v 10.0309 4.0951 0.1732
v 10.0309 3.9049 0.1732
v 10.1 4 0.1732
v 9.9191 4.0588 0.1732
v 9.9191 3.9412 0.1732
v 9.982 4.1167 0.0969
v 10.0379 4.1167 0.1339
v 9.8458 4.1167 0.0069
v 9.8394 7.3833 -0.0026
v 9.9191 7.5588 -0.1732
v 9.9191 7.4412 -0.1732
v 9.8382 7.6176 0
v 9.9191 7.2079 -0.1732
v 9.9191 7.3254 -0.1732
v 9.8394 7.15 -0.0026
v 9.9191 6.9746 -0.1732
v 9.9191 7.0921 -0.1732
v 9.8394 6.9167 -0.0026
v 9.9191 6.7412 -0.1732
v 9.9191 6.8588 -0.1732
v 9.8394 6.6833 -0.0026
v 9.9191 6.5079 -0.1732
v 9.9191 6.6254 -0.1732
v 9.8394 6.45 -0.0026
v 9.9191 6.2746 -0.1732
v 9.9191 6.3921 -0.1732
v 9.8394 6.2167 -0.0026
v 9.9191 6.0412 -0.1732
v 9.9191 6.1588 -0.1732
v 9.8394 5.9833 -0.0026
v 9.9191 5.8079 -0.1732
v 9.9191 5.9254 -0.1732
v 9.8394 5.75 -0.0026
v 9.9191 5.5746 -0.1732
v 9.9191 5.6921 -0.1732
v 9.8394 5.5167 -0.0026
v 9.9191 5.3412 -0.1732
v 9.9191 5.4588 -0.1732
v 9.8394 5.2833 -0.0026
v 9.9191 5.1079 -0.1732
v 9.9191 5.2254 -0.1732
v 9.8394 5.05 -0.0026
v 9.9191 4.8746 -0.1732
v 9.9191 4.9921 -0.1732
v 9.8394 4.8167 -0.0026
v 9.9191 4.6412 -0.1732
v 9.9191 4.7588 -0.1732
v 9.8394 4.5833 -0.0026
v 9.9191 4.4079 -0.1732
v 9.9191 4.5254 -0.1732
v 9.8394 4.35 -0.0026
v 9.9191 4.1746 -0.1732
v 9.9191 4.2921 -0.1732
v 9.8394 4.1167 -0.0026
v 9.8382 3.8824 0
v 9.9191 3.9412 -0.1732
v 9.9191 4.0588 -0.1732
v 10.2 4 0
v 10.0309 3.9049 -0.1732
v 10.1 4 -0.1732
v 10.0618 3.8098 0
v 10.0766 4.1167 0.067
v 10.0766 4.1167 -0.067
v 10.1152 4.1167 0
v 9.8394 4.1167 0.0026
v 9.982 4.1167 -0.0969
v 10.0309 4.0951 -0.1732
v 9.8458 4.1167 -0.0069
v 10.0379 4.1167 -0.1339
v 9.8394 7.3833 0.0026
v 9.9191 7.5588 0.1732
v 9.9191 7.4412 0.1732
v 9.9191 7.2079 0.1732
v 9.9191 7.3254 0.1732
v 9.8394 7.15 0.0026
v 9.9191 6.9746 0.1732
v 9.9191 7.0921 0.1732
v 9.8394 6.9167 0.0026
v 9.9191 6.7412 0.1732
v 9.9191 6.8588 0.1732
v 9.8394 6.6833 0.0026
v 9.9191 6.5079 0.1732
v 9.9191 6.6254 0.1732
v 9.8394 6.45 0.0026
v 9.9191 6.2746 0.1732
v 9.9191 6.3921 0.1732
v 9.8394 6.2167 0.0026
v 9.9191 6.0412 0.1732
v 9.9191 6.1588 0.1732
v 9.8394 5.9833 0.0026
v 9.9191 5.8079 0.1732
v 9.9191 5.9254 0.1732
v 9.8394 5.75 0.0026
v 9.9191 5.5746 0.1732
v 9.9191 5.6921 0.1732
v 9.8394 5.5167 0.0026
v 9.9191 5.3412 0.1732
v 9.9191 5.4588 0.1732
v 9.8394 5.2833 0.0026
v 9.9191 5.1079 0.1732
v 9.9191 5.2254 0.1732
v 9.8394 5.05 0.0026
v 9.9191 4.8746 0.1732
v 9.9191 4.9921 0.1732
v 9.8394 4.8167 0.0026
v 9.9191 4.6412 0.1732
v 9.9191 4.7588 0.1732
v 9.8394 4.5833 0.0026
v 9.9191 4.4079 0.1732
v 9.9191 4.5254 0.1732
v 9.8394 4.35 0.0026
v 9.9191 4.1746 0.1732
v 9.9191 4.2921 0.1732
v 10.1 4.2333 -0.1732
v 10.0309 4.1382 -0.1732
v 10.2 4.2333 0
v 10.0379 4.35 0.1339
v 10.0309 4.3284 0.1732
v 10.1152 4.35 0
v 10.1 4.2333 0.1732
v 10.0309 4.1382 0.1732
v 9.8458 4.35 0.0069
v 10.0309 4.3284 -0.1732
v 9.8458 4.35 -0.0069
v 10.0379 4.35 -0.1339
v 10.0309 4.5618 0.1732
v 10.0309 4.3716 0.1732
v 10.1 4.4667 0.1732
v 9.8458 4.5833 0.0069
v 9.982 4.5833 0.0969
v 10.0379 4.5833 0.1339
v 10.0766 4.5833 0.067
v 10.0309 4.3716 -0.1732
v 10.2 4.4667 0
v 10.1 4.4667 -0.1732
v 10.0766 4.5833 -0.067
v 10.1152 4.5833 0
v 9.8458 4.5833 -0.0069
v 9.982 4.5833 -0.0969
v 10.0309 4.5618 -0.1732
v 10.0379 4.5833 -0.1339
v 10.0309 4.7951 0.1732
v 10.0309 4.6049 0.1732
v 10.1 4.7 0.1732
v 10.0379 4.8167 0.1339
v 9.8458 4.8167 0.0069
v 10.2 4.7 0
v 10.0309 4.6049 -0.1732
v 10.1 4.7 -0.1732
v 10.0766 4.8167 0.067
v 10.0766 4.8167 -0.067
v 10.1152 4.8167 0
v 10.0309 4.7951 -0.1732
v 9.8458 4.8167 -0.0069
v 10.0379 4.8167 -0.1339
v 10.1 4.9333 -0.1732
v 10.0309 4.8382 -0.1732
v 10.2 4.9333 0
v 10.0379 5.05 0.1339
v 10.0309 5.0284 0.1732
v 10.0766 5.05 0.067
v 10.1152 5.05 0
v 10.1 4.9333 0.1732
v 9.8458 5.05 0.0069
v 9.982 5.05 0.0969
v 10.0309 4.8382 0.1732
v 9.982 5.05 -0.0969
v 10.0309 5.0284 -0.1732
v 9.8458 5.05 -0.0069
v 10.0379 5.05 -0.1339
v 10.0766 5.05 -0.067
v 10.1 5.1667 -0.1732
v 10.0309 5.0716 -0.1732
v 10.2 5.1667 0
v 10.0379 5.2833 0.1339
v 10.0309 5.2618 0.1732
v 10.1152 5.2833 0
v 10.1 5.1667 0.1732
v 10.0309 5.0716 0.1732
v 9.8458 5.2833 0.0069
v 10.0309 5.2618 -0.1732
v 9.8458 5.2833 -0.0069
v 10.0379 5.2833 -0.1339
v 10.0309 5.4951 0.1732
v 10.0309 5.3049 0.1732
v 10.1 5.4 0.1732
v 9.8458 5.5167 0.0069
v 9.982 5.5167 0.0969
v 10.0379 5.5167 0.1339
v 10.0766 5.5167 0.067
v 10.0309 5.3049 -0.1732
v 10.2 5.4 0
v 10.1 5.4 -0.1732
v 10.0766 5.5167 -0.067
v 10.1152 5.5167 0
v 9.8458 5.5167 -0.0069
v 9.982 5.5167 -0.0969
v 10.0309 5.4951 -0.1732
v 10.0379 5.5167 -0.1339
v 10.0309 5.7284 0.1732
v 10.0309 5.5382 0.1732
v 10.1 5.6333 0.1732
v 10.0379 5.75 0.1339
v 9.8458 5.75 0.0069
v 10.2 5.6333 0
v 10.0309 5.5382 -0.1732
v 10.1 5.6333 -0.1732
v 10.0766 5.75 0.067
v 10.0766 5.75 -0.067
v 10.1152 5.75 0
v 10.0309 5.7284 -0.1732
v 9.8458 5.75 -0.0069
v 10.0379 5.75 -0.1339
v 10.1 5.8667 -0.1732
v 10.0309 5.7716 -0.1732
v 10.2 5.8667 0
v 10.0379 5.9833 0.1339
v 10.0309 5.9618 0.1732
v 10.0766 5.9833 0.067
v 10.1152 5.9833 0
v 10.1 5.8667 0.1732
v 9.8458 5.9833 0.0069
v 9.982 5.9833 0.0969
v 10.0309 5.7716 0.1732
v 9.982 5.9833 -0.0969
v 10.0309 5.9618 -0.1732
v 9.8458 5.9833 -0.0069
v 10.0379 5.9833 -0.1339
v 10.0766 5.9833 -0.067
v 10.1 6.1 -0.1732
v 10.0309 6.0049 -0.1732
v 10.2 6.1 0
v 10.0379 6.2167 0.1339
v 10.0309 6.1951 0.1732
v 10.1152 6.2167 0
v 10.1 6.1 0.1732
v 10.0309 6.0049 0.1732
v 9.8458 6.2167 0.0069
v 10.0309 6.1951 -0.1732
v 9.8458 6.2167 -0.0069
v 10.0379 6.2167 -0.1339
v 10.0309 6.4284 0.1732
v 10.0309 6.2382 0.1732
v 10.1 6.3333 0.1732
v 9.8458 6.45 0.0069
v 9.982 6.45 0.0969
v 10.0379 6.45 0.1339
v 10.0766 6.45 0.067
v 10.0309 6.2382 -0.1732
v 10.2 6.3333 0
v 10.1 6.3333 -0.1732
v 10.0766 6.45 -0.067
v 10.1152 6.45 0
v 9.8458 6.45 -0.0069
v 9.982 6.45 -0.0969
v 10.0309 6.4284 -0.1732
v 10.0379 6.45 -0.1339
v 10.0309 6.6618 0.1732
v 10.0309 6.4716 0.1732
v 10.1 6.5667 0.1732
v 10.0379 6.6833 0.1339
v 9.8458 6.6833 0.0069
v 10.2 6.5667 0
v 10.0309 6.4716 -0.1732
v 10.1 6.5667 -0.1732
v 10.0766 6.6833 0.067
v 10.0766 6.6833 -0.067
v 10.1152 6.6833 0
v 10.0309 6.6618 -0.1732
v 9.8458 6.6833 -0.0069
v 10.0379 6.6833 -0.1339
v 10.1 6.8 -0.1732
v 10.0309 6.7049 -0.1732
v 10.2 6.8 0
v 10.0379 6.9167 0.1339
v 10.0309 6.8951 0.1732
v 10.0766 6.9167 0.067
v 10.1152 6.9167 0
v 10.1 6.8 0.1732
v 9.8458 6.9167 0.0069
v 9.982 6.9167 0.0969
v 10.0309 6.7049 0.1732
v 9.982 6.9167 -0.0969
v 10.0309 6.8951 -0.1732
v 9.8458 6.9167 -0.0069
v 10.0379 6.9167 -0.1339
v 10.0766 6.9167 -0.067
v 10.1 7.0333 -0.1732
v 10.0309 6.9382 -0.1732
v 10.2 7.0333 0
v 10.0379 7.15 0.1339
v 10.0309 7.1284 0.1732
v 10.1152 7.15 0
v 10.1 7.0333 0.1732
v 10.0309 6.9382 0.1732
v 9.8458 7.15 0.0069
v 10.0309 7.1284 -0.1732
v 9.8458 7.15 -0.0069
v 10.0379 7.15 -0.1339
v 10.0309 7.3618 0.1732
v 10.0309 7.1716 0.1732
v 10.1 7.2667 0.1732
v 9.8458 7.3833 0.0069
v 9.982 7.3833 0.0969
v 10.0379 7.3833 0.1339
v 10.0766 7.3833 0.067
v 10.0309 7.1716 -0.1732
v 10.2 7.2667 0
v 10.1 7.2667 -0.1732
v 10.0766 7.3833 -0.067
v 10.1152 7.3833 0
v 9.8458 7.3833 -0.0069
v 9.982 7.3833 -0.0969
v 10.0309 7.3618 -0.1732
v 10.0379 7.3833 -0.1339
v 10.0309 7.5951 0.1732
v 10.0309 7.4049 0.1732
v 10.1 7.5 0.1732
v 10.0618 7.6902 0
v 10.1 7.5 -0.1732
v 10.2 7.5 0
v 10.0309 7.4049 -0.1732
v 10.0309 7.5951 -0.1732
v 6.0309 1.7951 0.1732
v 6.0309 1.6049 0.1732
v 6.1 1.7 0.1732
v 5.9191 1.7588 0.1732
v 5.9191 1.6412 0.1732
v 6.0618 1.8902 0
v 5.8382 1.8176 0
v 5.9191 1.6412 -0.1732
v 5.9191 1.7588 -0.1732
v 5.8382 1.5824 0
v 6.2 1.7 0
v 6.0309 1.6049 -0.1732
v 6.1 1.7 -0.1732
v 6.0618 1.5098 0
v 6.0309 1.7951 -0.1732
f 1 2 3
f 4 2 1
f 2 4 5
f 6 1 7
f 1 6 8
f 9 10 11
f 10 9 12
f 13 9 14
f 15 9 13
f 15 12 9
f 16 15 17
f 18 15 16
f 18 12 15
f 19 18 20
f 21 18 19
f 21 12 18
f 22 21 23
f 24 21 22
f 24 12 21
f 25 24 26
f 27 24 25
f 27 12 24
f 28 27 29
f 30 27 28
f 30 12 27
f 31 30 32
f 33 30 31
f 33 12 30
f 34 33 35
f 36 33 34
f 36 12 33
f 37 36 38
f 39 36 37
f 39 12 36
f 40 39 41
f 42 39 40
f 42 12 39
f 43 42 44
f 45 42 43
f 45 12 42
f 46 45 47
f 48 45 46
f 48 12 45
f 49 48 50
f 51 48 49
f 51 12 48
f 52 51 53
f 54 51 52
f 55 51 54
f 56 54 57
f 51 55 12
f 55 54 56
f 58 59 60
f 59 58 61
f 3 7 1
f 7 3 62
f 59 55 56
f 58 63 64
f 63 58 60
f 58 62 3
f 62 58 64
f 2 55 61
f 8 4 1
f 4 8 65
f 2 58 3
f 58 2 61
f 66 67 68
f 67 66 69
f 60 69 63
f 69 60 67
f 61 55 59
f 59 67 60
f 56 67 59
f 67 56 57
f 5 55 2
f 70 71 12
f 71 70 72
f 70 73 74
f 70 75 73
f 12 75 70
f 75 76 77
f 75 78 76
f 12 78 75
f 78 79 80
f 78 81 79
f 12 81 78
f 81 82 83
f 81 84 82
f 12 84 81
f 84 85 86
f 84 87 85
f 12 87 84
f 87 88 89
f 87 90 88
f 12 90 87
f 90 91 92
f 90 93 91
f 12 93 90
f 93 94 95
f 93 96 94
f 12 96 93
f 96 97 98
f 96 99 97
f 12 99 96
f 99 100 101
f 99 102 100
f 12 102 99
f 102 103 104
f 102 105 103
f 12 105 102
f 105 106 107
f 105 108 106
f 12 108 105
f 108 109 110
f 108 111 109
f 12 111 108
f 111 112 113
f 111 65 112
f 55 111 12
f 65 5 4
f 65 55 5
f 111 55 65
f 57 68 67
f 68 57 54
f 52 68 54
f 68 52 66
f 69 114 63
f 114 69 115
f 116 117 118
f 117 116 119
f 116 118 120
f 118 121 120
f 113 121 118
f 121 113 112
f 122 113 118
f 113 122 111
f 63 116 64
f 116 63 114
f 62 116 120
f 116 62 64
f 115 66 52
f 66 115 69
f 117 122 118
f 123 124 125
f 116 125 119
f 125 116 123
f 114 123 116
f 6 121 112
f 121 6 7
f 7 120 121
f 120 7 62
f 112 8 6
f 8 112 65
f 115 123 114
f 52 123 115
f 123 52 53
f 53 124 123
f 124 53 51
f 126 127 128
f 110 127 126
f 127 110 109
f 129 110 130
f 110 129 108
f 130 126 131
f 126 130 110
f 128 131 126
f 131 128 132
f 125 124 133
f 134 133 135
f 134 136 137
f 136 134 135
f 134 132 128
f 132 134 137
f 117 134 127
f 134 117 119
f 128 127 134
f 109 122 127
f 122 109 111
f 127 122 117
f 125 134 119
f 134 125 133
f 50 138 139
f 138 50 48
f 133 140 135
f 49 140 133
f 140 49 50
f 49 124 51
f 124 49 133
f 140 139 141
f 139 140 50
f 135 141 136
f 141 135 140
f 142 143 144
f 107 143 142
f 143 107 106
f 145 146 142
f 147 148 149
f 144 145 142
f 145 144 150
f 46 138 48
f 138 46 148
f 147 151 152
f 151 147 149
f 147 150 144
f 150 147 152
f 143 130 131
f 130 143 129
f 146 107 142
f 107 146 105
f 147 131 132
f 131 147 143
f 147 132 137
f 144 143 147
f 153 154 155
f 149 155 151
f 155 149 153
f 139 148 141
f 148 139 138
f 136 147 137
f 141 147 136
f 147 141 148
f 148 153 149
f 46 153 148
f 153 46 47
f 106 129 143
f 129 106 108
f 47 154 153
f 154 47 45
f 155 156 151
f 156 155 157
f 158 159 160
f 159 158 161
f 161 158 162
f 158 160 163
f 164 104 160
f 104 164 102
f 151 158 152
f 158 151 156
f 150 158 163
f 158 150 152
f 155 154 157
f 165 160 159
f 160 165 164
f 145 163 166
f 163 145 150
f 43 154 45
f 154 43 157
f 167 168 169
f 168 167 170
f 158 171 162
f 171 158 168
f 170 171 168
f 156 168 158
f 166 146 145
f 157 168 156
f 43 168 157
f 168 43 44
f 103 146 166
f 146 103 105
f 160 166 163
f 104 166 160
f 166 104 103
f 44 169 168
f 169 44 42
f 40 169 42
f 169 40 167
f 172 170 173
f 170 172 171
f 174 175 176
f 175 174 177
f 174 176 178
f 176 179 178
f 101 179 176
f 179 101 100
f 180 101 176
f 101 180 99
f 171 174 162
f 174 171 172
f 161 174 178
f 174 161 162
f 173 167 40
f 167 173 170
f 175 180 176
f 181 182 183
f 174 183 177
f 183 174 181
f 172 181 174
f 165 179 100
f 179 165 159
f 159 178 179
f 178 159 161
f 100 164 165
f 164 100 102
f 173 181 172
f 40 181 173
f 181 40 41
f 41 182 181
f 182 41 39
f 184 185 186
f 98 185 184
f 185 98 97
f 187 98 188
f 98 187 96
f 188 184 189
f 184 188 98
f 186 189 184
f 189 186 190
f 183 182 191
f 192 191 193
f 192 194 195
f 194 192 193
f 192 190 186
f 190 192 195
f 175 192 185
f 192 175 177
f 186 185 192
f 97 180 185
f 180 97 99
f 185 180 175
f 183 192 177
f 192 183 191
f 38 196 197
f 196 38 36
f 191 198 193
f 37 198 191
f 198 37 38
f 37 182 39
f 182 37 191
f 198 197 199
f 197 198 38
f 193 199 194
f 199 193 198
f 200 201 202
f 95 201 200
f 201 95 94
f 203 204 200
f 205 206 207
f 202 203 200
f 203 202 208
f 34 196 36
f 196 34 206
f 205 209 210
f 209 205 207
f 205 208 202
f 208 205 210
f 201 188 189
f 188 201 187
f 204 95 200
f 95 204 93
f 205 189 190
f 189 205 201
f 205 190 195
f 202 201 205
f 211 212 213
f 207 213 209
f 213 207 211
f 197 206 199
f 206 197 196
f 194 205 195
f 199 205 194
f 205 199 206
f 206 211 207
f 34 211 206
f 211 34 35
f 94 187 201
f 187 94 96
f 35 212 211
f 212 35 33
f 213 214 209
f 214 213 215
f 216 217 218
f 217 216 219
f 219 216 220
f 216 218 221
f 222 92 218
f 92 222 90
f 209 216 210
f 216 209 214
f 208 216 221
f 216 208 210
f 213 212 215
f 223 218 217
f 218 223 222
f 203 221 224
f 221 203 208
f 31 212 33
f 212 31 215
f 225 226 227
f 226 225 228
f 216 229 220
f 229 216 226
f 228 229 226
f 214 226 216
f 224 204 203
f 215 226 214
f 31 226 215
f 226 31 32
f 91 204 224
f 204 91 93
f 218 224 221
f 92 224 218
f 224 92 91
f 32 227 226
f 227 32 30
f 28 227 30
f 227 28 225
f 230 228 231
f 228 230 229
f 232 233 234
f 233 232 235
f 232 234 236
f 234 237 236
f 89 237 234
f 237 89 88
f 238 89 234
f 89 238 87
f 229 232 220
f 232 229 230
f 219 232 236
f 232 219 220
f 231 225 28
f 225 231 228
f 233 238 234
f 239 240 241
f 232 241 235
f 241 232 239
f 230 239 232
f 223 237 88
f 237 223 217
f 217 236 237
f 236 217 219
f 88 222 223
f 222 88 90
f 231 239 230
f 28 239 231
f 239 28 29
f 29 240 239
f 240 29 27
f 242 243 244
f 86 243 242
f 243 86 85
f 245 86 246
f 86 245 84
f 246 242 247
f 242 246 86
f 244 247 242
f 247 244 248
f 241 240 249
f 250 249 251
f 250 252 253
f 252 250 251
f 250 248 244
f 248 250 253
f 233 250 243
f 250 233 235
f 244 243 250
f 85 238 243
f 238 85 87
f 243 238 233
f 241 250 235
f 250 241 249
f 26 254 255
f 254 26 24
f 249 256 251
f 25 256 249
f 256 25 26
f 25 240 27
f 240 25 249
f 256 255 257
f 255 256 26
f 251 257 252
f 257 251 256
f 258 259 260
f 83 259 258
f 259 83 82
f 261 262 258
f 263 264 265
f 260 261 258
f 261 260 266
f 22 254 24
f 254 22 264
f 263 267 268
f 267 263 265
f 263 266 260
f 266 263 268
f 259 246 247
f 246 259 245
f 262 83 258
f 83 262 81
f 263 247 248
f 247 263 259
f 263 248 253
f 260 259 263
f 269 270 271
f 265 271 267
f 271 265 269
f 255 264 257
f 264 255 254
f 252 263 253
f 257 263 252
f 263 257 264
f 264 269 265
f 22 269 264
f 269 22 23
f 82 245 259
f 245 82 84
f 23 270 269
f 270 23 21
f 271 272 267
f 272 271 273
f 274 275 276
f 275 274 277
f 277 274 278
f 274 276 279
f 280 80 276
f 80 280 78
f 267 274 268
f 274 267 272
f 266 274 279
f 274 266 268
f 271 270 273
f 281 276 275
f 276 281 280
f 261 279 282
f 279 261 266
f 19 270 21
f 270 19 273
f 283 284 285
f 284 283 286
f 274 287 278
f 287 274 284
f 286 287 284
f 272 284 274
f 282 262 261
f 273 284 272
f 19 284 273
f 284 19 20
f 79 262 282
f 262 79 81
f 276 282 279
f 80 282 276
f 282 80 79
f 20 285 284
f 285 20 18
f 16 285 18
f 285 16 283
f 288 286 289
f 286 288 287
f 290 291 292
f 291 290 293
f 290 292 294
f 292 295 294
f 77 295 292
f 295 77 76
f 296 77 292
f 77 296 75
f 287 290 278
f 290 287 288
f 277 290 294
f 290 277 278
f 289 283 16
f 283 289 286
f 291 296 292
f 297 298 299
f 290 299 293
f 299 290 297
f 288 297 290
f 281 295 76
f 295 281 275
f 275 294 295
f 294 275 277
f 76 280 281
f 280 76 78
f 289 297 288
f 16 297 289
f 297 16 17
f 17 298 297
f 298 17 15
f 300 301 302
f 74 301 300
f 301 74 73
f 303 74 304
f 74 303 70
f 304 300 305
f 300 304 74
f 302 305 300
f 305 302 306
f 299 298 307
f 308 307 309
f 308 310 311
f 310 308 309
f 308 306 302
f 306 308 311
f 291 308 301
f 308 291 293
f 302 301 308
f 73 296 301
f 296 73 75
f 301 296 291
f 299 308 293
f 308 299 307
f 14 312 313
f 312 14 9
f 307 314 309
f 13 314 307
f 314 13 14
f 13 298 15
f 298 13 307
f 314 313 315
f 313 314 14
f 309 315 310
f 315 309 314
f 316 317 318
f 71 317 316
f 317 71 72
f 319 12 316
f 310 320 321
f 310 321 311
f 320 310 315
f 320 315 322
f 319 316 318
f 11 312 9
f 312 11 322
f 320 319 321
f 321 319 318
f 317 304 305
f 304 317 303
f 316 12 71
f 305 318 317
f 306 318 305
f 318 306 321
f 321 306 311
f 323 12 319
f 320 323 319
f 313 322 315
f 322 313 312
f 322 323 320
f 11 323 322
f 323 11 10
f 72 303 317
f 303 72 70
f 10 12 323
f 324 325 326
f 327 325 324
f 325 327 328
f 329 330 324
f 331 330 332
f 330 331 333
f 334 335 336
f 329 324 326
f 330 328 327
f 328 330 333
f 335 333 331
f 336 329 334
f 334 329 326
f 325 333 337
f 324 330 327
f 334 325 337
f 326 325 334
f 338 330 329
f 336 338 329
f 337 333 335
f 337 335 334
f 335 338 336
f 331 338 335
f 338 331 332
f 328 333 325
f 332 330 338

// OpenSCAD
// points
p1 = [10, 7.5];
p2 = [10, 4];
p3 = [6, 1.7];

n = 15;

for (i = [0 : 1/n : 1]) 
    translate(p1 * i + p2 * (1-i)) 
        sphere(0.2);


for (i = [p1, p2, p3]) translate(i) color("black") sphere(0.2);
